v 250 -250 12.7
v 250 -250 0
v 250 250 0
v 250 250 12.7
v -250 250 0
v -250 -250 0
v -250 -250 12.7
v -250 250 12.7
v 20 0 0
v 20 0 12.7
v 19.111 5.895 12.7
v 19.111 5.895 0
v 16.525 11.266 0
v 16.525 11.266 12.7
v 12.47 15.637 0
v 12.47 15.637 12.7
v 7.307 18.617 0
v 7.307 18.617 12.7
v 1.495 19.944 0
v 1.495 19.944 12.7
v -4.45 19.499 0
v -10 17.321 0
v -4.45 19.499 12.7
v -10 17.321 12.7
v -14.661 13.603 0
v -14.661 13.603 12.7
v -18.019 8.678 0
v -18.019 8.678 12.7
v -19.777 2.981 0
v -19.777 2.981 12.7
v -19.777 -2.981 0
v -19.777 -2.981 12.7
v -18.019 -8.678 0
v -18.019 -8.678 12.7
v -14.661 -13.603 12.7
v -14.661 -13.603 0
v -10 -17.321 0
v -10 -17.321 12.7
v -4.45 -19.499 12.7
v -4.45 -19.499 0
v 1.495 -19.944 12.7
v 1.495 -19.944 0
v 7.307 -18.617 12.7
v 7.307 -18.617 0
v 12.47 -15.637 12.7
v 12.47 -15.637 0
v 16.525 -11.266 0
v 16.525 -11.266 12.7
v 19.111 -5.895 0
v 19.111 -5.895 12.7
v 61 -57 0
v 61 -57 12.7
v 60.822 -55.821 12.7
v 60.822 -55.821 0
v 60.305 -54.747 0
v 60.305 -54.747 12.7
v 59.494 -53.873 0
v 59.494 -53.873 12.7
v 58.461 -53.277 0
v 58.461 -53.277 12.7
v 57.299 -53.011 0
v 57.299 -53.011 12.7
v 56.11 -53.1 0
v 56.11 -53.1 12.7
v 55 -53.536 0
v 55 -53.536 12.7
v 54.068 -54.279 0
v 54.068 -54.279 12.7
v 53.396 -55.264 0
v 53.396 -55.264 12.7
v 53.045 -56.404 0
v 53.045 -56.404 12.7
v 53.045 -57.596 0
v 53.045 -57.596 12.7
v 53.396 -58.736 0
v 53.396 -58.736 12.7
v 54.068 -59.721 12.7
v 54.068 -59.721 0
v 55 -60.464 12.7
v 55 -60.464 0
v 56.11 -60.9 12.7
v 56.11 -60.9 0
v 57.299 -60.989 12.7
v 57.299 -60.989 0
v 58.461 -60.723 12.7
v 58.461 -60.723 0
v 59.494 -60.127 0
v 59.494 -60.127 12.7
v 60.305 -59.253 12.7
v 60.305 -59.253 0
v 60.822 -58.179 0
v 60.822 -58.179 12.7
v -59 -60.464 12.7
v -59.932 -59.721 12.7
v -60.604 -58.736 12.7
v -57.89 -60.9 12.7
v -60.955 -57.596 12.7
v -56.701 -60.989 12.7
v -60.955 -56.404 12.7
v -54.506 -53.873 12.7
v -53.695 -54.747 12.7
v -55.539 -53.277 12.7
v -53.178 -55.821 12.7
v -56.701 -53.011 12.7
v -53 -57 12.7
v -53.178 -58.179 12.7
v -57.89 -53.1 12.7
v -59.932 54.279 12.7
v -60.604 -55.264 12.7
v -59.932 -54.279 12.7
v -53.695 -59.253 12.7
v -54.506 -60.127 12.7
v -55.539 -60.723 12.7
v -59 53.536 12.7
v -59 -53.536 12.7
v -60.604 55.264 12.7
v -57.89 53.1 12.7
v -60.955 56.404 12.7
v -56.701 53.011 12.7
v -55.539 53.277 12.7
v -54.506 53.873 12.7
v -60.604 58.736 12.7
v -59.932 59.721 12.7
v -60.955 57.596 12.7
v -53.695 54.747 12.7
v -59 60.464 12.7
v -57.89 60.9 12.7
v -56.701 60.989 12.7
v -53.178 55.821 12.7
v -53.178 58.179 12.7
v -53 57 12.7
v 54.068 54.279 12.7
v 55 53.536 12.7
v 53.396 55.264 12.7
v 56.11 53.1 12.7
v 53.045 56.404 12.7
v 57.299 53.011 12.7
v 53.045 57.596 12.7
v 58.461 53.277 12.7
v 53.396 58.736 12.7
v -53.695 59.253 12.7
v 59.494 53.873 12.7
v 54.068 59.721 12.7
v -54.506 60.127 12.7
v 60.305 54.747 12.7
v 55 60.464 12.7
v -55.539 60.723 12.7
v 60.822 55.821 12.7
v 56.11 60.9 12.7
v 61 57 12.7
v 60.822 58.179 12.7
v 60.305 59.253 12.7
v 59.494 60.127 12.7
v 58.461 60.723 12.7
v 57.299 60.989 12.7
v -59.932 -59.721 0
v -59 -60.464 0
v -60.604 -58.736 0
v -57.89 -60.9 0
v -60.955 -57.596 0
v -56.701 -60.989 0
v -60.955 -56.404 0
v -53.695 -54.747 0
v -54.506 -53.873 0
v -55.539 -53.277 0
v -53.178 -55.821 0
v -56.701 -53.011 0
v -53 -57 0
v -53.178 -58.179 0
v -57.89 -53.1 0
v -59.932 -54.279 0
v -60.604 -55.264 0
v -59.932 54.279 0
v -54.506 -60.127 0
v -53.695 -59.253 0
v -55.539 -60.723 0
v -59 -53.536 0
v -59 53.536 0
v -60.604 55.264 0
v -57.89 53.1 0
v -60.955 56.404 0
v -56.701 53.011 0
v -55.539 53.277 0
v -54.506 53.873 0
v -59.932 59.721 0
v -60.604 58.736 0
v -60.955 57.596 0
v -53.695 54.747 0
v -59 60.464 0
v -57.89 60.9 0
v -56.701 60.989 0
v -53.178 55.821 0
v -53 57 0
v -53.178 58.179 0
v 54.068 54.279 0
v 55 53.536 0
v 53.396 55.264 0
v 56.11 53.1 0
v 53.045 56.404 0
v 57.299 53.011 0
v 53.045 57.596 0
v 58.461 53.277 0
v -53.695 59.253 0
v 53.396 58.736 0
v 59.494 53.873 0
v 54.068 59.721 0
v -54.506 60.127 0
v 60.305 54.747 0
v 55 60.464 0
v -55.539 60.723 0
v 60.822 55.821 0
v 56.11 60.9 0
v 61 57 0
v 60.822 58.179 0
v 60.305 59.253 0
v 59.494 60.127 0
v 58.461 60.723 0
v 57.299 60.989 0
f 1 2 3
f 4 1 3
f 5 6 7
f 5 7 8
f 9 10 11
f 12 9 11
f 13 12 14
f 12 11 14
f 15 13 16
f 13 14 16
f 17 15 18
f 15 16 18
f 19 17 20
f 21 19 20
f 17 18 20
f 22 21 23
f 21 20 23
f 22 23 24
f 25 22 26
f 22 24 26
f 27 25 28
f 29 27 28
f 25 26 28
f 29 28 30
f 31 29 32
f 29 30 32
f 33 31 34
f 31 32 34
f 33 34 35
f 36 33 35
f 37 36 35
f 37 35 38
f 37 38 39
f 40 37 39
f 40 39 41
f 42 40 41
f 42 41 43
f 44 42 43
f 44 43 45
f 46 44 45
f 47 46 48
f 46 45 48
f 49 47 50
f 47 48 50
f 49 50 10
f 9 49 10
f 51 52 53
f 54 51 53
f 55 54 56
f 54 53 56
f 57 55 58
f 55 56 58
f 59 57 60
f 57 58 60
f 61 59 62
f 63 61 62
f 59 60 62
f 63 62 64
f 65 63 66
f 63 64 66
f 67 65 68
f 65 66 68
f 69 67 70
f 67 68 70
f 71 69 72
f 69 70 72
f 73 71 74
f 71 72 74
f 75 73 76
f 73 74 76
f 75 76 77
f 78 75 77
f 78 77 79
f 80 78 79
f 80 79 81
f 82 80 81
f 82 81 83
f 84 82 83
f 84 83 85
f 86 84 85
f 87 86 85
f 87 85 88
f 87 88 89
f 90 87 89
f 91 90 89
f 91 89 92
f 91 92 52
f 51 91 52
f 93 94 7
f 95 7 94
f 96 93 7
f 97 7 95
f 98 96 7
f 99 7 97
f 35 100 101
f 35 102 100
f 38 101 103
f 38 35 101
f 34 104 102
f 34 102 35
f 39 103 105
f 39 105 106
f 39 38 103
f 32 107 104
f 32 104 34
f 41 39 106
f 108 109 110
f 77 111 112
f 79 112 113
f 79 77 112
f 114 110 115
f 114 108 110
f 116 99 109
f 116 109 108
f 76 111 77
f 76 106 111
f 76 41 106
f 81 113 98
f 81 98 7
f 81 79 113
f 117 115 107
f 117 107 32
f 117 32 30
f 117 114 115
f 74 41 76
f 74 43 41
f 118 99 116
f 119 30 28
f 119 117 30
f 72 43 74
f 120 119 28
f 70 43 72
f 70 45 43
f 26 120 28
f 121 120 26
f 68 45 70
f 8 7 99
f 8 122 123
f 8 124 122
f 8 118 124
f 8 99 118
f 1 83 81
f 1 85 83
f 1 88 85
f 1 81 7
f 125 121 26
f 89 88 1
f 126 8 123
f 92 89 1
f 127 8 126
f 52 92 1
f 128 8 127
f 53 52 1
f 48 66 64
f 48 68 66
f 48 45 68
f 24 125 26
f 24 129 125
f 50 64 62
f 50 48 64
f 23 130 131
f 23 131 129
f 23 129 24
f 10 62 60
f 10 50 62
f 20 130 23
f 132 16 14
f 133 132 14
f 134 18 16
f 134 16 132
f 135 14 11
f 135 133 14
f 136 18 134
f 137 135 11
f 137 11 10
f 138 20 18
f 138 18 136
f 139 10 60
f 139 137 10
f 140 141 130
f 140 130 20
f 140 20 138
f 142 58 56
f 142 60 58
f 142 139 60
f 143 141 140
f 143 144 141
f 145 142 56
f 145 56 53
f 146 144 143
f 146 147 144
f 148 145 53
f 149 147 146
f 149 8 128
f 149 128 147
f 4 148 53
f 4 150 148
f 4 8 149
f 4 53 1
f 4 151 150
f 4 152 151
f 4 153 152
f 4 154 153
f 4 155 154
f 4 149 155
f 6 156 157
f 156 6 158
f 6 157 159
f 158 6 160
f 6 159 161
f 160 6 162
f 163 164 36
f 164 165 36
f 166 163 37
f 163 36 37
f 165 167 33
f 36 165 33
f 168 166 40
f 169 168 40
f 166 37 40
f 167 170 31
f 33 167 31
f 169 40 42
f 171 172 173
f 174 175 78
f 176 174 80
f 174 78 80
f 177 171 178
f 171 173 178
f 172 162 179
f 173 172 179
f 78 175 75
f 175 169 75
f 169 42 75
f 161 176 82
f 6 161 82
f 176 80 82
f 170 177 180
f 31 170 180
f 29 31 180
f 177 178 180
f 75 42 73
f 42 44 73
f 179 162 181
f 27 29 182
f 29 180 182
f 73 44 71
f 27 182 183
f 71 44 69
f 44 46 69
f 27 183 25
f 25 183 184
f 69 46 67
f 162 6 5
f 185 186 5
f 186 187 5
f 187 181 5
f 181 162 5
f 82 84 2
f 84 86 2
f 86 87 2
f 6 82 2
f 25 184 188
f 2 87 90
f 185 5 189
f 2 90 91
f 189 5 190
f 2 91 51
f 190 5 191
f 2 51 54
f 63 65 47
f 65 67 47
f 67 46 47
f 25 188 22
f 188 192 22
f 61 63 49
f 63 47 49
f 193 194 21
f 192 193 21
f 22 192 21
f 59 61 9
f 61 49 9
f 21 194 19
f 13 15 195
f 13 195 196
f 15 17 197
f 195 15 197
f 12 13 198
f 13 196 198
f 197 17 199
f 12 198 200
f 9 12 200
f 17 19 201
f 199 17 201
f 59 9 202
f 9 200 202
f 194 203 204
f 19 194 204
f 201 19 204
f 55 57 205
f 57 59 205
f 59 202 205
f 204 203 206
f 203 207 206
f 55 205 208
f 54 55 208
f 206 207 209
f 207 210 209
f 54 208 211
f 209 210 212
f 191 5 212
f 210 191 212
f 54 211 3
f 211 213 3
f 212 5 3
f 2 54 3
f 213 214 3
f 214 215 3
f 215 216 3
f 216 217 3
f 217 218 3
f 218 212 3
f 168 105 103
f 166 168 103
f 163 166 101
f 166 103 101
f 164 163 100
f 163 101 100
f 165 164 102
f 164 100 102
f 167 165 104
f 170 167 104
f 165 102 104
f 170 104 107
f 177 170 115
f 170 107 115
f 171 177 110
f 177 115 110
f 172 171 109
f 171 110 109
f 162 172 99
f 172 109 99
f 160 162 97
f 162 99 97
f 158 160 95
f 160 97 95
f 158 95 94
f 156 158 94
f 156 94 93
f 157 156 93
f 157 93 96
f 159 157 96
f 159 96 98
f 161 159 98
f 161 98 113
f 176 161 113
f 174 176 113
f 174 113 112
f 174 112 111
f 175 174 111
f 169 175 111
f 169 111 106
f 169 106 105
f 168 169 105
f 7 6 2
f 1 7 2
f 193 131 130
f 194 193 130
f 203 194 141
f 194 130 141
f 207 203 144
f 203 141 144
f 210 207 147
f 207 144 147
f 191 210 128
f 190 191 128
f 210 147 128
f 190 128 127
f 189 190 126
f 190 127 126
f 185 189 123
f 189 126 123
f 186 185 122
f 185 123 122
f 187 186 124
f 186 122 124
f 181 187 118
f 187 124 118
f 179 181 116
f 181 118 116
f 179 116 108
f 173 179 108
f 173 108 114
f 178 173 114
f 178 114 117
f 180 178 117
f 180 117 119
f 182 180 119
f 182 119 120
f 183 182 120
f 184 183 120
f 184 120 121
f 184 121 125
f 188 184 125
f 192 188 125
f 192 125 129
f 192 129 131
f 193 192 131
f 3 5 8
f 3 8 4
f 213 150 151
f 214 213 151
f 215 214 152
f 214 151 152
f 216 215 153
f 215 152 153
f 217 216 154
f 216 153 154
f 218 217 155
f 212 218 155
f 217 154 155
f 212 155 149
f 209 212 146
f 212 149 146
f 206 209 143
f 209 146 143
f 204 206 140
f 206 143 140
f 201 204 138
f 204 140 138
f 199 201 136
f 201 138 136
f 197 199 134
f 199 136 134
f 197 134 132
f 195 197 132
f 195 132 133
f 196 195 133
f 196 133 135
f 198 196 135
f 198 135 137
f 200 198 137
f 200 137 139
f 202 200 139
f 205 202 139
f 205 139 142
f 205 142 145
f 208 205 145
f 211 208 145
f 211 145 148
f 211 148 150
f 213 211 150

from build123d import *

# Parameters (mm, degrees)
SKETCH1_W                   = 500
SKETCH1_H                   = 500
BOSS_EXTRUDE1_DEPTH         = 12.7
SKETCH4_R                   = 20
CUT_EXTRUDE1_DEPTH          = 12.7
F_8_0_MM_DOWEL_HOLES1_D     = 8
F_8_0_MM_DOWEL_HOLES1_DEPTH = 19.75
F_8_0_MM_DOWEL_HOLES1_TIP   = 2.403442476


with BuildPart() as part:
    # Sketch1 → Boss-Extrude1 (new body)
    with BuildSketch(Plane.XY):
        Rectangle(SKETCH1_W, SKETCH1_H)
    extrude(amount=BOSS_EXTRUDE1_DEPTH)

    # Sketch4 → Cut-Extrude1 (cut)
    with BuildSketch(Plane.XY.offset(12.7)):
        Circle(SKETCH4_R)
    extrude(amount=-CUT_EXTRUDE1_DEPTH, mode=Mode.SUBTRACT)

    # Ø8.0 mm Dowel Holes1
    with Locations(Plane(origin=(0, 0, 0), x_dir=(-1, 0, 0), z_dir=(0, 0, -1))):
        with Locations((57, 57), (-57, 57), (-57, -57), (57, -57)):
            Hole(F_8_0_MM_DOWEL_HOLES1_D / 2, depth=F_8_0_MM_DOWEL_HOLES1_DEPTH)
            with Locations((0, 0, -(F_8_0_MM_DOWEL_HOLES1_DEPTH + F_8_0_MM_DOWEL_HOLES1_TIP / 2))):  # 118° drill point
                Cone(0, F_8_0_MM_DOWEL_HOLES1_D / 2, F_8_0_MM_DOWEL_HOLES1_TIP, mode=Mode.SUBTRACT)


solid = part.part
